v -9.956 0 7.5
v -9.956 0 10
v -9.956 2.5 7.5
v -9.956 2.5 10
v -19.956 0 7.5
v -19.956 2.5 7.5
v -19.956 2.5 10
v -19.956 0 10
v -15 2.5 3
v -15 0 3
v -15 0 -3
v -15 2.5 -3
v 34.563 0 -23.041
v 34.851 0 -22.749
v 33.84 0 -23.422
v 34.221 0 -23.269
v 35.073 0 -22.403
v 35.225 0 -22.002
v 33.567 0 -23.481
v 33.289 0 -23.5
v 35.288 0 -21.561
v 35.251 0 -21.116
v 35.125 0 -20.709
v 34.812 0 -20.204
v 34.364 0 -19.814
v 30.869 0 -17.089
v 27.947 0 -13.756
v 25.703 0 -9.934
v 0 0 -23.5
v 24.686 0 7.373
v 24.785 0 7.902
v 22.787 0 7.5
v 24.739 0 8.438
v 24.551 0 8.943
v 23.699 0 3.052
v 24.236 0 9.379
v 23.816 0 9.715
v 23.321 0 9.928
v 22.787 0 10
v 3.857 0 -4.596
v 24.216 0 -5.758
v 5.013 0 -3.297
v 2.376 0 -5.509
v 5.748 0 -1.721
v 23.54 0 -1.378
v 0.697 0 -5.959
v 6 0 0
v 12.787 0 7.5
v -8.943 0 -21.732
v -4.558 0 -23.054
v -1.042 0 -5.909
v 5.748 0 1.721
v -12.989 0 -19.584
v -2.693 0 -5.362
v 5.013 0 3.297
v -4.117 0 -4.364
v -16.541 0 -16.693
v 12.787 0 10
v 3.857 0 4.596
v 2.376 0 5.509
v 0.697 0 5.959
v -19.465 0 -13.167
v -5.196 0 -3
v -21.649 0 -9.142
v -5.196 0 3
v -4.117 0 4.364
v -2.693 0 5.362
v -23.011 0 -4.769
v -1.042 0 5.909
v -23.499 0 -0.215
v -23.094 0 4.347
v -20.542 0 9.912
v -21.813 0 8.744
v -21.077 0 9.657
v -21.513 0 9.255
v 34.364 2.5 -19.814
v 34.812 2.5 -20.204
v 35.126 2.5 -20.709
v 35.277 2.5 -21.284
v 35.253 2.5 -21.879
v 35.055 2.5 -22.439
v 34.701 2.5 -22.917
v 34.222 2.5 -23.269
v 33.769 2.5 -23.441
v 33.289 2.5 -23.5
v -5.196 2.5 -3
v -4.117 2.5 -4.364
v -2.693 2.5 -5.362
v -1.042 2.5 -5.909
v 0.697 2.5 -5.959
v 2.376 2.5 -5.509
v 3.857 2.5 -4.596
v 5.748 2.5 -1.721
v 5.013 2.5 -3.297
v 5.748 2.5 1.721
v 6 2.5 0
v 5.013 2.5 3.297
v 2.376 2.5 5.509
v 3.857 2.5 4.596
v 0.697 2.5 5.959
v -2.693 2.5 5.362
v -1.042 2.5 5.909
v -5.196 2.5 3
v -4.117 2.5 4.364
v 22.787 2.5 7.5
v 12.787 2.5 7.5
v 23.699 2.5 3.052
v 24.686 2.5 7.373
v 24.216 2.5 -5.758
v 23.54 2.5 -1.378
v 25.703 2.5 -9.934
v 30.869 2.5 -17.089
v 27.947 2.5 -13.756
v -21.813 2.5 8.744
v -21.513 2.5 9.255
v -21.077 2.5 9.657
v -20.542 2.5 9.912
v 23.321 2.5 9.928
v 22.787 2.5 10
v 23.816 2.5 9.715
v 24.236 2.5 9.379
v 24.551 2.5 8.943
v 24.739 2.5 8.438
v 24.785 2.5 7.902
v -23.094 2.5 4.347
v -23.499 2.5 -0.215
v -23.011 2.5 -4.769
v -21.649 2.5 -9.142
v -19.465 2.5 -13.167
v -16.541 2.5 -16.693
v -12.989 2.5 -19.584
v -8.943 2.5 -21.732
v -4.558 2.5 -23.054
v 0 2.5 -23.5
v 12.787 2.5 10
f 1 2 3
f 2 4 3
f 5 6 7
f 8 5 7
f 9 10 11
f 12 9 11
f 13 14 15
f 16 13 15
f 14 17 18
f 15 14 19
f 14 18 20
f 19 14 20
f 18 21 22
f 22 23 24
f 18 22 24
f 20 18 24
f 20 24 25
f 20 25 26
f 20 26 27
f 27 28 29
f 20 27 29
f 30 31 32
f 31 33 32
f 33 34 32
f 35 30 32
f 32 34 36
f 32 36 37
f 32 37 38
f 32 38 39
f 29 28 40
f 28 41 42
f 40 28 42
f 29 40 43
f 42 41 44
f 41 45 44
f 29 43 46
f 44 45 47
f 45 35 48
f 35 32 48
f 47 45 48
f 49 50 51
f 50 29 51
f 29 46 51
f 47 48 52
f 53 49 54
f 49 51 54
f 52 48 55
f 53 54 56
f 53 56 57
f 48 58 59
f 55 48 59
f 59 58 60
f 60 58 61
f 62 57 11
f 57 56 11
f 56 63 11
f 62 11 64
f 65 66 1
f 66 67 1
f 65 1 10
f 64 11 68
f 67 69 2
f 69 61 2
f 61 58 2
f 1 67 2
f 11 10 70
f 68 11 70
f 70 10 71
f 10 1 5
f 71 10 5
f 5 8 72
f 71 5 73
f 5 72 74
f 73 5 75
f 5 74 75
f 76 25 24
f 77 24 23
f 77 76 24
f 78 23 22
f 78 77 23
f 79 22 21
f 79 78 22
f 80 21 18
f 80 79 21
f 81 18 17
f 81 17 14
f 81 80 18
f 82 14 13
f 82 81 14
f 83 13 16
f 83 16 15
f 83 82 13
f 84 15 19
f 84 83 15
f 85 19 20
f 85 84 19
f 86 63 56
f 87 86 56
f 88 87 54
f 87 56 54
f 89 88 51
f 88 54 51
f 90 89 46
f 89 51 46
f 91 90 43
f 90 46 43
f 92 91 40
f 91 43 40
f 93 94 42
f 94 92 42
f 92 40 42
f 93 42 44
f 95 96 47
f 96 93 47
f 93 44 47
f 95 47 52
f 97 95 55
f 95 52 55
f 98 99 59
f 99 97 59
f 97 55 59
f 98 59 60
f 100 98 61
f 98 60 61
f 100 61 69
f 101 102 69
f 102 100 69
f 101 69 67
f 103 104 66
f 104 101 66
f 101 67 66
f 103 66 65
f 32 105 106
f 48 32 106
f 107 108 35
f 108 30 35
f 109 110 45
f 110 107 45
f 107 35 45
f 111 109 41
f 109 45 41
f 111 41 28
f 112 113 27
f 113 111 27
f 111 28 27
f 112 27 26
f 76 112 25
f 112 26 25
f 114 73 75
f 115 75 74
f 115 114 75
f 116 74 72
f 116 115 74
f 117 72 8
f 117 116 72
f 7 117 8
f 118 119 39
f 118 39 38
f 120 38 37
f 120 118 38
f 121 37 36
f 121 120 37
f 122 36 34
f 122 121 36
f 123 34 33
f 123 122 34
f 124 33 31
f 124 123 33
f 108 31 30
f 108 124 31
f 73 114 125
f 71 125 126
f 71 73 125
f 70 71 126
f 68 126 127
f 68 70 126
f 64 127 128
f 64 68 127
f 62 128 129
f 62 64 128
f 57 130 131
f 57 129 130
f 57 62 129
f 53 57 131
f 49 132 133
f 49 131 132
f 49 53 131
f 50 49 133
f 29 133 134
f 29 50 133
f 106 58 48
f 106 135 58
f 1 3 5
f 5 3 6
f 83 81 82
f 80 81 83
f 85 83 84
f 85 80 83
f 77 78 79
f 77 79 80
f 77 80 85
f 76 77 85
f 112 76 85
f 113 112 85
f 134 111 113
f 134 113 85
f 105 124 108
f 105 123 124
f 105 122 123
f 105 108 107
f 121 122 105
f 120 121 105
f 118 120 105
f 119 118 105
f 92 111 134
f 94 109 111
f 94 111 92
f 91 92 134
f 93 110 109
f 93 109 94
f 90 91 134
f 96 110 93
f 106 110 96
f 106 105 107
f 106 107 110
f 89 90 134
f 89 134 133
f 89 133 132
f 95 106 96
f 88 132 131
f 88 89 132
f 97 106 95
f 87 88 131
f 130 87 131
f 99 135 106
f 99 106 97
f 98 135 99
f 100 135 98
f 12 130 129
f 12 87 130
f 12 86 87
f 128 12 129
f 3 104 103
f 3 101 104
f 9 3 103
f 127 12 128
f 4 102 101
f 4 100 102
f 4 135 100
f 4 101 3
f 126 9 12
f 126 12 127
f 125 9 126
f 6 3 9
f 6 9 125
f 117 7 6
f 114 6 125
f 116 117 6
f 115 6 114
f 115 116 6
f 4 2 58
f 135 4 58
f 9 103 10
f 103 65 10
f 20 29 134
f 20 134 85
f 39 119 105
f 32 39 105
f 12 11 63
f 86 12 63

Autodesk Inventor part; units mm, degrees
ref_plane "YZ Plane" through (0, 0, 0) normal (1, 0, 0) x (0, 1, 0)
ref_plane "XZ Plane" through (0, 0, 0) normal (0, 1, 0) x (-1, 0, 0)
ref_plane "XY Plane" through (0, 0, 0) normal (0, 0, 1) x (1, 0, 0)
sketch "スケッチ1" plane through (0, 0, 0) normal (0, 1, 0) x (-1, 0, 0)
  circle A0 centre (0, 0) radius 6
  line L0 (0, 3) -> (15, 3)
  line L1 (15, 3) -> (15, -3)
  line L2 (15, -3) -> (0, -3)
  line L3 (0, -3) -> (0, 3) construction
  line L4 (23.5, 10) -> (-25.7338, 10)
  line L5 (-25.7338, 10) -> (-25.7338, -10) construction
  line L6 (-25.7338, -10) -> (23.5, -10)
  line L7 (23.5, -10) -> (23.5, 10) construction
  circle A1 centre (0, 0) radius 23.5
  circle A2 centre (-47, 0) radius 23.5
  line L8 (-23.5, 10) -> (-23.5, 0)
  line L9 (0, -23.5) -> (-47, -23.5)
  line L10 (0, 23.5) -> (-47, 23.5)
  point P0 (-25.7338, 0)
  point P1 (20.3516, -11.75)
  point P2 (-26.6484, -11.75)
  point P3 (5.1962, -3)
  point P4 (5.1962, 3)
  point P5 (21.2662, 10)
  point P6 (-21.2662, 10)
  dimension "d0" = 12
  dimension "d1" = 15
  dimension "d2" = 6
  dimension "d3" = 20
  dimension "d4" = 47
  dimension "d5" = 47
  dimension "d6" = 47
extrude "押し出し1" add sketch "スケッチ1" along normal blind 2.5 contours L8 A2 L4 | L4 A1 L8 | L4 A1 L6 | A1 L6 A2 | A1 L9 A2 L6 | L6 A1
fillet "フィレット2" radius 2 3 edges at (47, 1.25, -23.5) (25.7338, 1.25, 10) (-21.2662, 1.25, 10)
sketch "スケッチ2" plane through (0, 2.5, 0) normal (0, 1, 0) x (1, 0, 0)
  line L0 (-19.9562, -10) -> (22.7874, -10) projected
  line L1 (-19.9562, -10) -> (22.7874, -10)
  line L2 (22.7874, -10) -> (22.7874, -7.5)
  line L3 (22.7874, -7.5) -> (-19.9562, -7.5)
  line L4 (-19.9562, -7.5) -> (-19.9562, -10)
  line L5 (-19.9562, -10) -> (-9.9562, -10)
  line L6 (-9.9562, -10) -> (-9.9562, -7.5)
  line L7 (-9.9562, -7.5) -> (-19.9562, -7.5)
  line L8 (-19.9562, -7.5) -> (-19.9562, -10)
  line L9 (22.7874, -10) -> (12.7874, -10)
  line L10 (12.7874, -10) -> (12.7874, -7.5)
  line L11 (12.7874, -7.5) -> (22.7874, -7.5)
  line L12 (22.7874, -7.5) -> (22.7874, -10)
  point P0 (0, 0)
  dimension "d13" = 2.5
  dimension "d14" = 10
  dimension "d15" = 10
extrude "押し出し2" cut sketch "スケッチ2" against normal through all contours L4 L3 L6 L0 | L10 L3 L2 L0
properties part number "皿"
